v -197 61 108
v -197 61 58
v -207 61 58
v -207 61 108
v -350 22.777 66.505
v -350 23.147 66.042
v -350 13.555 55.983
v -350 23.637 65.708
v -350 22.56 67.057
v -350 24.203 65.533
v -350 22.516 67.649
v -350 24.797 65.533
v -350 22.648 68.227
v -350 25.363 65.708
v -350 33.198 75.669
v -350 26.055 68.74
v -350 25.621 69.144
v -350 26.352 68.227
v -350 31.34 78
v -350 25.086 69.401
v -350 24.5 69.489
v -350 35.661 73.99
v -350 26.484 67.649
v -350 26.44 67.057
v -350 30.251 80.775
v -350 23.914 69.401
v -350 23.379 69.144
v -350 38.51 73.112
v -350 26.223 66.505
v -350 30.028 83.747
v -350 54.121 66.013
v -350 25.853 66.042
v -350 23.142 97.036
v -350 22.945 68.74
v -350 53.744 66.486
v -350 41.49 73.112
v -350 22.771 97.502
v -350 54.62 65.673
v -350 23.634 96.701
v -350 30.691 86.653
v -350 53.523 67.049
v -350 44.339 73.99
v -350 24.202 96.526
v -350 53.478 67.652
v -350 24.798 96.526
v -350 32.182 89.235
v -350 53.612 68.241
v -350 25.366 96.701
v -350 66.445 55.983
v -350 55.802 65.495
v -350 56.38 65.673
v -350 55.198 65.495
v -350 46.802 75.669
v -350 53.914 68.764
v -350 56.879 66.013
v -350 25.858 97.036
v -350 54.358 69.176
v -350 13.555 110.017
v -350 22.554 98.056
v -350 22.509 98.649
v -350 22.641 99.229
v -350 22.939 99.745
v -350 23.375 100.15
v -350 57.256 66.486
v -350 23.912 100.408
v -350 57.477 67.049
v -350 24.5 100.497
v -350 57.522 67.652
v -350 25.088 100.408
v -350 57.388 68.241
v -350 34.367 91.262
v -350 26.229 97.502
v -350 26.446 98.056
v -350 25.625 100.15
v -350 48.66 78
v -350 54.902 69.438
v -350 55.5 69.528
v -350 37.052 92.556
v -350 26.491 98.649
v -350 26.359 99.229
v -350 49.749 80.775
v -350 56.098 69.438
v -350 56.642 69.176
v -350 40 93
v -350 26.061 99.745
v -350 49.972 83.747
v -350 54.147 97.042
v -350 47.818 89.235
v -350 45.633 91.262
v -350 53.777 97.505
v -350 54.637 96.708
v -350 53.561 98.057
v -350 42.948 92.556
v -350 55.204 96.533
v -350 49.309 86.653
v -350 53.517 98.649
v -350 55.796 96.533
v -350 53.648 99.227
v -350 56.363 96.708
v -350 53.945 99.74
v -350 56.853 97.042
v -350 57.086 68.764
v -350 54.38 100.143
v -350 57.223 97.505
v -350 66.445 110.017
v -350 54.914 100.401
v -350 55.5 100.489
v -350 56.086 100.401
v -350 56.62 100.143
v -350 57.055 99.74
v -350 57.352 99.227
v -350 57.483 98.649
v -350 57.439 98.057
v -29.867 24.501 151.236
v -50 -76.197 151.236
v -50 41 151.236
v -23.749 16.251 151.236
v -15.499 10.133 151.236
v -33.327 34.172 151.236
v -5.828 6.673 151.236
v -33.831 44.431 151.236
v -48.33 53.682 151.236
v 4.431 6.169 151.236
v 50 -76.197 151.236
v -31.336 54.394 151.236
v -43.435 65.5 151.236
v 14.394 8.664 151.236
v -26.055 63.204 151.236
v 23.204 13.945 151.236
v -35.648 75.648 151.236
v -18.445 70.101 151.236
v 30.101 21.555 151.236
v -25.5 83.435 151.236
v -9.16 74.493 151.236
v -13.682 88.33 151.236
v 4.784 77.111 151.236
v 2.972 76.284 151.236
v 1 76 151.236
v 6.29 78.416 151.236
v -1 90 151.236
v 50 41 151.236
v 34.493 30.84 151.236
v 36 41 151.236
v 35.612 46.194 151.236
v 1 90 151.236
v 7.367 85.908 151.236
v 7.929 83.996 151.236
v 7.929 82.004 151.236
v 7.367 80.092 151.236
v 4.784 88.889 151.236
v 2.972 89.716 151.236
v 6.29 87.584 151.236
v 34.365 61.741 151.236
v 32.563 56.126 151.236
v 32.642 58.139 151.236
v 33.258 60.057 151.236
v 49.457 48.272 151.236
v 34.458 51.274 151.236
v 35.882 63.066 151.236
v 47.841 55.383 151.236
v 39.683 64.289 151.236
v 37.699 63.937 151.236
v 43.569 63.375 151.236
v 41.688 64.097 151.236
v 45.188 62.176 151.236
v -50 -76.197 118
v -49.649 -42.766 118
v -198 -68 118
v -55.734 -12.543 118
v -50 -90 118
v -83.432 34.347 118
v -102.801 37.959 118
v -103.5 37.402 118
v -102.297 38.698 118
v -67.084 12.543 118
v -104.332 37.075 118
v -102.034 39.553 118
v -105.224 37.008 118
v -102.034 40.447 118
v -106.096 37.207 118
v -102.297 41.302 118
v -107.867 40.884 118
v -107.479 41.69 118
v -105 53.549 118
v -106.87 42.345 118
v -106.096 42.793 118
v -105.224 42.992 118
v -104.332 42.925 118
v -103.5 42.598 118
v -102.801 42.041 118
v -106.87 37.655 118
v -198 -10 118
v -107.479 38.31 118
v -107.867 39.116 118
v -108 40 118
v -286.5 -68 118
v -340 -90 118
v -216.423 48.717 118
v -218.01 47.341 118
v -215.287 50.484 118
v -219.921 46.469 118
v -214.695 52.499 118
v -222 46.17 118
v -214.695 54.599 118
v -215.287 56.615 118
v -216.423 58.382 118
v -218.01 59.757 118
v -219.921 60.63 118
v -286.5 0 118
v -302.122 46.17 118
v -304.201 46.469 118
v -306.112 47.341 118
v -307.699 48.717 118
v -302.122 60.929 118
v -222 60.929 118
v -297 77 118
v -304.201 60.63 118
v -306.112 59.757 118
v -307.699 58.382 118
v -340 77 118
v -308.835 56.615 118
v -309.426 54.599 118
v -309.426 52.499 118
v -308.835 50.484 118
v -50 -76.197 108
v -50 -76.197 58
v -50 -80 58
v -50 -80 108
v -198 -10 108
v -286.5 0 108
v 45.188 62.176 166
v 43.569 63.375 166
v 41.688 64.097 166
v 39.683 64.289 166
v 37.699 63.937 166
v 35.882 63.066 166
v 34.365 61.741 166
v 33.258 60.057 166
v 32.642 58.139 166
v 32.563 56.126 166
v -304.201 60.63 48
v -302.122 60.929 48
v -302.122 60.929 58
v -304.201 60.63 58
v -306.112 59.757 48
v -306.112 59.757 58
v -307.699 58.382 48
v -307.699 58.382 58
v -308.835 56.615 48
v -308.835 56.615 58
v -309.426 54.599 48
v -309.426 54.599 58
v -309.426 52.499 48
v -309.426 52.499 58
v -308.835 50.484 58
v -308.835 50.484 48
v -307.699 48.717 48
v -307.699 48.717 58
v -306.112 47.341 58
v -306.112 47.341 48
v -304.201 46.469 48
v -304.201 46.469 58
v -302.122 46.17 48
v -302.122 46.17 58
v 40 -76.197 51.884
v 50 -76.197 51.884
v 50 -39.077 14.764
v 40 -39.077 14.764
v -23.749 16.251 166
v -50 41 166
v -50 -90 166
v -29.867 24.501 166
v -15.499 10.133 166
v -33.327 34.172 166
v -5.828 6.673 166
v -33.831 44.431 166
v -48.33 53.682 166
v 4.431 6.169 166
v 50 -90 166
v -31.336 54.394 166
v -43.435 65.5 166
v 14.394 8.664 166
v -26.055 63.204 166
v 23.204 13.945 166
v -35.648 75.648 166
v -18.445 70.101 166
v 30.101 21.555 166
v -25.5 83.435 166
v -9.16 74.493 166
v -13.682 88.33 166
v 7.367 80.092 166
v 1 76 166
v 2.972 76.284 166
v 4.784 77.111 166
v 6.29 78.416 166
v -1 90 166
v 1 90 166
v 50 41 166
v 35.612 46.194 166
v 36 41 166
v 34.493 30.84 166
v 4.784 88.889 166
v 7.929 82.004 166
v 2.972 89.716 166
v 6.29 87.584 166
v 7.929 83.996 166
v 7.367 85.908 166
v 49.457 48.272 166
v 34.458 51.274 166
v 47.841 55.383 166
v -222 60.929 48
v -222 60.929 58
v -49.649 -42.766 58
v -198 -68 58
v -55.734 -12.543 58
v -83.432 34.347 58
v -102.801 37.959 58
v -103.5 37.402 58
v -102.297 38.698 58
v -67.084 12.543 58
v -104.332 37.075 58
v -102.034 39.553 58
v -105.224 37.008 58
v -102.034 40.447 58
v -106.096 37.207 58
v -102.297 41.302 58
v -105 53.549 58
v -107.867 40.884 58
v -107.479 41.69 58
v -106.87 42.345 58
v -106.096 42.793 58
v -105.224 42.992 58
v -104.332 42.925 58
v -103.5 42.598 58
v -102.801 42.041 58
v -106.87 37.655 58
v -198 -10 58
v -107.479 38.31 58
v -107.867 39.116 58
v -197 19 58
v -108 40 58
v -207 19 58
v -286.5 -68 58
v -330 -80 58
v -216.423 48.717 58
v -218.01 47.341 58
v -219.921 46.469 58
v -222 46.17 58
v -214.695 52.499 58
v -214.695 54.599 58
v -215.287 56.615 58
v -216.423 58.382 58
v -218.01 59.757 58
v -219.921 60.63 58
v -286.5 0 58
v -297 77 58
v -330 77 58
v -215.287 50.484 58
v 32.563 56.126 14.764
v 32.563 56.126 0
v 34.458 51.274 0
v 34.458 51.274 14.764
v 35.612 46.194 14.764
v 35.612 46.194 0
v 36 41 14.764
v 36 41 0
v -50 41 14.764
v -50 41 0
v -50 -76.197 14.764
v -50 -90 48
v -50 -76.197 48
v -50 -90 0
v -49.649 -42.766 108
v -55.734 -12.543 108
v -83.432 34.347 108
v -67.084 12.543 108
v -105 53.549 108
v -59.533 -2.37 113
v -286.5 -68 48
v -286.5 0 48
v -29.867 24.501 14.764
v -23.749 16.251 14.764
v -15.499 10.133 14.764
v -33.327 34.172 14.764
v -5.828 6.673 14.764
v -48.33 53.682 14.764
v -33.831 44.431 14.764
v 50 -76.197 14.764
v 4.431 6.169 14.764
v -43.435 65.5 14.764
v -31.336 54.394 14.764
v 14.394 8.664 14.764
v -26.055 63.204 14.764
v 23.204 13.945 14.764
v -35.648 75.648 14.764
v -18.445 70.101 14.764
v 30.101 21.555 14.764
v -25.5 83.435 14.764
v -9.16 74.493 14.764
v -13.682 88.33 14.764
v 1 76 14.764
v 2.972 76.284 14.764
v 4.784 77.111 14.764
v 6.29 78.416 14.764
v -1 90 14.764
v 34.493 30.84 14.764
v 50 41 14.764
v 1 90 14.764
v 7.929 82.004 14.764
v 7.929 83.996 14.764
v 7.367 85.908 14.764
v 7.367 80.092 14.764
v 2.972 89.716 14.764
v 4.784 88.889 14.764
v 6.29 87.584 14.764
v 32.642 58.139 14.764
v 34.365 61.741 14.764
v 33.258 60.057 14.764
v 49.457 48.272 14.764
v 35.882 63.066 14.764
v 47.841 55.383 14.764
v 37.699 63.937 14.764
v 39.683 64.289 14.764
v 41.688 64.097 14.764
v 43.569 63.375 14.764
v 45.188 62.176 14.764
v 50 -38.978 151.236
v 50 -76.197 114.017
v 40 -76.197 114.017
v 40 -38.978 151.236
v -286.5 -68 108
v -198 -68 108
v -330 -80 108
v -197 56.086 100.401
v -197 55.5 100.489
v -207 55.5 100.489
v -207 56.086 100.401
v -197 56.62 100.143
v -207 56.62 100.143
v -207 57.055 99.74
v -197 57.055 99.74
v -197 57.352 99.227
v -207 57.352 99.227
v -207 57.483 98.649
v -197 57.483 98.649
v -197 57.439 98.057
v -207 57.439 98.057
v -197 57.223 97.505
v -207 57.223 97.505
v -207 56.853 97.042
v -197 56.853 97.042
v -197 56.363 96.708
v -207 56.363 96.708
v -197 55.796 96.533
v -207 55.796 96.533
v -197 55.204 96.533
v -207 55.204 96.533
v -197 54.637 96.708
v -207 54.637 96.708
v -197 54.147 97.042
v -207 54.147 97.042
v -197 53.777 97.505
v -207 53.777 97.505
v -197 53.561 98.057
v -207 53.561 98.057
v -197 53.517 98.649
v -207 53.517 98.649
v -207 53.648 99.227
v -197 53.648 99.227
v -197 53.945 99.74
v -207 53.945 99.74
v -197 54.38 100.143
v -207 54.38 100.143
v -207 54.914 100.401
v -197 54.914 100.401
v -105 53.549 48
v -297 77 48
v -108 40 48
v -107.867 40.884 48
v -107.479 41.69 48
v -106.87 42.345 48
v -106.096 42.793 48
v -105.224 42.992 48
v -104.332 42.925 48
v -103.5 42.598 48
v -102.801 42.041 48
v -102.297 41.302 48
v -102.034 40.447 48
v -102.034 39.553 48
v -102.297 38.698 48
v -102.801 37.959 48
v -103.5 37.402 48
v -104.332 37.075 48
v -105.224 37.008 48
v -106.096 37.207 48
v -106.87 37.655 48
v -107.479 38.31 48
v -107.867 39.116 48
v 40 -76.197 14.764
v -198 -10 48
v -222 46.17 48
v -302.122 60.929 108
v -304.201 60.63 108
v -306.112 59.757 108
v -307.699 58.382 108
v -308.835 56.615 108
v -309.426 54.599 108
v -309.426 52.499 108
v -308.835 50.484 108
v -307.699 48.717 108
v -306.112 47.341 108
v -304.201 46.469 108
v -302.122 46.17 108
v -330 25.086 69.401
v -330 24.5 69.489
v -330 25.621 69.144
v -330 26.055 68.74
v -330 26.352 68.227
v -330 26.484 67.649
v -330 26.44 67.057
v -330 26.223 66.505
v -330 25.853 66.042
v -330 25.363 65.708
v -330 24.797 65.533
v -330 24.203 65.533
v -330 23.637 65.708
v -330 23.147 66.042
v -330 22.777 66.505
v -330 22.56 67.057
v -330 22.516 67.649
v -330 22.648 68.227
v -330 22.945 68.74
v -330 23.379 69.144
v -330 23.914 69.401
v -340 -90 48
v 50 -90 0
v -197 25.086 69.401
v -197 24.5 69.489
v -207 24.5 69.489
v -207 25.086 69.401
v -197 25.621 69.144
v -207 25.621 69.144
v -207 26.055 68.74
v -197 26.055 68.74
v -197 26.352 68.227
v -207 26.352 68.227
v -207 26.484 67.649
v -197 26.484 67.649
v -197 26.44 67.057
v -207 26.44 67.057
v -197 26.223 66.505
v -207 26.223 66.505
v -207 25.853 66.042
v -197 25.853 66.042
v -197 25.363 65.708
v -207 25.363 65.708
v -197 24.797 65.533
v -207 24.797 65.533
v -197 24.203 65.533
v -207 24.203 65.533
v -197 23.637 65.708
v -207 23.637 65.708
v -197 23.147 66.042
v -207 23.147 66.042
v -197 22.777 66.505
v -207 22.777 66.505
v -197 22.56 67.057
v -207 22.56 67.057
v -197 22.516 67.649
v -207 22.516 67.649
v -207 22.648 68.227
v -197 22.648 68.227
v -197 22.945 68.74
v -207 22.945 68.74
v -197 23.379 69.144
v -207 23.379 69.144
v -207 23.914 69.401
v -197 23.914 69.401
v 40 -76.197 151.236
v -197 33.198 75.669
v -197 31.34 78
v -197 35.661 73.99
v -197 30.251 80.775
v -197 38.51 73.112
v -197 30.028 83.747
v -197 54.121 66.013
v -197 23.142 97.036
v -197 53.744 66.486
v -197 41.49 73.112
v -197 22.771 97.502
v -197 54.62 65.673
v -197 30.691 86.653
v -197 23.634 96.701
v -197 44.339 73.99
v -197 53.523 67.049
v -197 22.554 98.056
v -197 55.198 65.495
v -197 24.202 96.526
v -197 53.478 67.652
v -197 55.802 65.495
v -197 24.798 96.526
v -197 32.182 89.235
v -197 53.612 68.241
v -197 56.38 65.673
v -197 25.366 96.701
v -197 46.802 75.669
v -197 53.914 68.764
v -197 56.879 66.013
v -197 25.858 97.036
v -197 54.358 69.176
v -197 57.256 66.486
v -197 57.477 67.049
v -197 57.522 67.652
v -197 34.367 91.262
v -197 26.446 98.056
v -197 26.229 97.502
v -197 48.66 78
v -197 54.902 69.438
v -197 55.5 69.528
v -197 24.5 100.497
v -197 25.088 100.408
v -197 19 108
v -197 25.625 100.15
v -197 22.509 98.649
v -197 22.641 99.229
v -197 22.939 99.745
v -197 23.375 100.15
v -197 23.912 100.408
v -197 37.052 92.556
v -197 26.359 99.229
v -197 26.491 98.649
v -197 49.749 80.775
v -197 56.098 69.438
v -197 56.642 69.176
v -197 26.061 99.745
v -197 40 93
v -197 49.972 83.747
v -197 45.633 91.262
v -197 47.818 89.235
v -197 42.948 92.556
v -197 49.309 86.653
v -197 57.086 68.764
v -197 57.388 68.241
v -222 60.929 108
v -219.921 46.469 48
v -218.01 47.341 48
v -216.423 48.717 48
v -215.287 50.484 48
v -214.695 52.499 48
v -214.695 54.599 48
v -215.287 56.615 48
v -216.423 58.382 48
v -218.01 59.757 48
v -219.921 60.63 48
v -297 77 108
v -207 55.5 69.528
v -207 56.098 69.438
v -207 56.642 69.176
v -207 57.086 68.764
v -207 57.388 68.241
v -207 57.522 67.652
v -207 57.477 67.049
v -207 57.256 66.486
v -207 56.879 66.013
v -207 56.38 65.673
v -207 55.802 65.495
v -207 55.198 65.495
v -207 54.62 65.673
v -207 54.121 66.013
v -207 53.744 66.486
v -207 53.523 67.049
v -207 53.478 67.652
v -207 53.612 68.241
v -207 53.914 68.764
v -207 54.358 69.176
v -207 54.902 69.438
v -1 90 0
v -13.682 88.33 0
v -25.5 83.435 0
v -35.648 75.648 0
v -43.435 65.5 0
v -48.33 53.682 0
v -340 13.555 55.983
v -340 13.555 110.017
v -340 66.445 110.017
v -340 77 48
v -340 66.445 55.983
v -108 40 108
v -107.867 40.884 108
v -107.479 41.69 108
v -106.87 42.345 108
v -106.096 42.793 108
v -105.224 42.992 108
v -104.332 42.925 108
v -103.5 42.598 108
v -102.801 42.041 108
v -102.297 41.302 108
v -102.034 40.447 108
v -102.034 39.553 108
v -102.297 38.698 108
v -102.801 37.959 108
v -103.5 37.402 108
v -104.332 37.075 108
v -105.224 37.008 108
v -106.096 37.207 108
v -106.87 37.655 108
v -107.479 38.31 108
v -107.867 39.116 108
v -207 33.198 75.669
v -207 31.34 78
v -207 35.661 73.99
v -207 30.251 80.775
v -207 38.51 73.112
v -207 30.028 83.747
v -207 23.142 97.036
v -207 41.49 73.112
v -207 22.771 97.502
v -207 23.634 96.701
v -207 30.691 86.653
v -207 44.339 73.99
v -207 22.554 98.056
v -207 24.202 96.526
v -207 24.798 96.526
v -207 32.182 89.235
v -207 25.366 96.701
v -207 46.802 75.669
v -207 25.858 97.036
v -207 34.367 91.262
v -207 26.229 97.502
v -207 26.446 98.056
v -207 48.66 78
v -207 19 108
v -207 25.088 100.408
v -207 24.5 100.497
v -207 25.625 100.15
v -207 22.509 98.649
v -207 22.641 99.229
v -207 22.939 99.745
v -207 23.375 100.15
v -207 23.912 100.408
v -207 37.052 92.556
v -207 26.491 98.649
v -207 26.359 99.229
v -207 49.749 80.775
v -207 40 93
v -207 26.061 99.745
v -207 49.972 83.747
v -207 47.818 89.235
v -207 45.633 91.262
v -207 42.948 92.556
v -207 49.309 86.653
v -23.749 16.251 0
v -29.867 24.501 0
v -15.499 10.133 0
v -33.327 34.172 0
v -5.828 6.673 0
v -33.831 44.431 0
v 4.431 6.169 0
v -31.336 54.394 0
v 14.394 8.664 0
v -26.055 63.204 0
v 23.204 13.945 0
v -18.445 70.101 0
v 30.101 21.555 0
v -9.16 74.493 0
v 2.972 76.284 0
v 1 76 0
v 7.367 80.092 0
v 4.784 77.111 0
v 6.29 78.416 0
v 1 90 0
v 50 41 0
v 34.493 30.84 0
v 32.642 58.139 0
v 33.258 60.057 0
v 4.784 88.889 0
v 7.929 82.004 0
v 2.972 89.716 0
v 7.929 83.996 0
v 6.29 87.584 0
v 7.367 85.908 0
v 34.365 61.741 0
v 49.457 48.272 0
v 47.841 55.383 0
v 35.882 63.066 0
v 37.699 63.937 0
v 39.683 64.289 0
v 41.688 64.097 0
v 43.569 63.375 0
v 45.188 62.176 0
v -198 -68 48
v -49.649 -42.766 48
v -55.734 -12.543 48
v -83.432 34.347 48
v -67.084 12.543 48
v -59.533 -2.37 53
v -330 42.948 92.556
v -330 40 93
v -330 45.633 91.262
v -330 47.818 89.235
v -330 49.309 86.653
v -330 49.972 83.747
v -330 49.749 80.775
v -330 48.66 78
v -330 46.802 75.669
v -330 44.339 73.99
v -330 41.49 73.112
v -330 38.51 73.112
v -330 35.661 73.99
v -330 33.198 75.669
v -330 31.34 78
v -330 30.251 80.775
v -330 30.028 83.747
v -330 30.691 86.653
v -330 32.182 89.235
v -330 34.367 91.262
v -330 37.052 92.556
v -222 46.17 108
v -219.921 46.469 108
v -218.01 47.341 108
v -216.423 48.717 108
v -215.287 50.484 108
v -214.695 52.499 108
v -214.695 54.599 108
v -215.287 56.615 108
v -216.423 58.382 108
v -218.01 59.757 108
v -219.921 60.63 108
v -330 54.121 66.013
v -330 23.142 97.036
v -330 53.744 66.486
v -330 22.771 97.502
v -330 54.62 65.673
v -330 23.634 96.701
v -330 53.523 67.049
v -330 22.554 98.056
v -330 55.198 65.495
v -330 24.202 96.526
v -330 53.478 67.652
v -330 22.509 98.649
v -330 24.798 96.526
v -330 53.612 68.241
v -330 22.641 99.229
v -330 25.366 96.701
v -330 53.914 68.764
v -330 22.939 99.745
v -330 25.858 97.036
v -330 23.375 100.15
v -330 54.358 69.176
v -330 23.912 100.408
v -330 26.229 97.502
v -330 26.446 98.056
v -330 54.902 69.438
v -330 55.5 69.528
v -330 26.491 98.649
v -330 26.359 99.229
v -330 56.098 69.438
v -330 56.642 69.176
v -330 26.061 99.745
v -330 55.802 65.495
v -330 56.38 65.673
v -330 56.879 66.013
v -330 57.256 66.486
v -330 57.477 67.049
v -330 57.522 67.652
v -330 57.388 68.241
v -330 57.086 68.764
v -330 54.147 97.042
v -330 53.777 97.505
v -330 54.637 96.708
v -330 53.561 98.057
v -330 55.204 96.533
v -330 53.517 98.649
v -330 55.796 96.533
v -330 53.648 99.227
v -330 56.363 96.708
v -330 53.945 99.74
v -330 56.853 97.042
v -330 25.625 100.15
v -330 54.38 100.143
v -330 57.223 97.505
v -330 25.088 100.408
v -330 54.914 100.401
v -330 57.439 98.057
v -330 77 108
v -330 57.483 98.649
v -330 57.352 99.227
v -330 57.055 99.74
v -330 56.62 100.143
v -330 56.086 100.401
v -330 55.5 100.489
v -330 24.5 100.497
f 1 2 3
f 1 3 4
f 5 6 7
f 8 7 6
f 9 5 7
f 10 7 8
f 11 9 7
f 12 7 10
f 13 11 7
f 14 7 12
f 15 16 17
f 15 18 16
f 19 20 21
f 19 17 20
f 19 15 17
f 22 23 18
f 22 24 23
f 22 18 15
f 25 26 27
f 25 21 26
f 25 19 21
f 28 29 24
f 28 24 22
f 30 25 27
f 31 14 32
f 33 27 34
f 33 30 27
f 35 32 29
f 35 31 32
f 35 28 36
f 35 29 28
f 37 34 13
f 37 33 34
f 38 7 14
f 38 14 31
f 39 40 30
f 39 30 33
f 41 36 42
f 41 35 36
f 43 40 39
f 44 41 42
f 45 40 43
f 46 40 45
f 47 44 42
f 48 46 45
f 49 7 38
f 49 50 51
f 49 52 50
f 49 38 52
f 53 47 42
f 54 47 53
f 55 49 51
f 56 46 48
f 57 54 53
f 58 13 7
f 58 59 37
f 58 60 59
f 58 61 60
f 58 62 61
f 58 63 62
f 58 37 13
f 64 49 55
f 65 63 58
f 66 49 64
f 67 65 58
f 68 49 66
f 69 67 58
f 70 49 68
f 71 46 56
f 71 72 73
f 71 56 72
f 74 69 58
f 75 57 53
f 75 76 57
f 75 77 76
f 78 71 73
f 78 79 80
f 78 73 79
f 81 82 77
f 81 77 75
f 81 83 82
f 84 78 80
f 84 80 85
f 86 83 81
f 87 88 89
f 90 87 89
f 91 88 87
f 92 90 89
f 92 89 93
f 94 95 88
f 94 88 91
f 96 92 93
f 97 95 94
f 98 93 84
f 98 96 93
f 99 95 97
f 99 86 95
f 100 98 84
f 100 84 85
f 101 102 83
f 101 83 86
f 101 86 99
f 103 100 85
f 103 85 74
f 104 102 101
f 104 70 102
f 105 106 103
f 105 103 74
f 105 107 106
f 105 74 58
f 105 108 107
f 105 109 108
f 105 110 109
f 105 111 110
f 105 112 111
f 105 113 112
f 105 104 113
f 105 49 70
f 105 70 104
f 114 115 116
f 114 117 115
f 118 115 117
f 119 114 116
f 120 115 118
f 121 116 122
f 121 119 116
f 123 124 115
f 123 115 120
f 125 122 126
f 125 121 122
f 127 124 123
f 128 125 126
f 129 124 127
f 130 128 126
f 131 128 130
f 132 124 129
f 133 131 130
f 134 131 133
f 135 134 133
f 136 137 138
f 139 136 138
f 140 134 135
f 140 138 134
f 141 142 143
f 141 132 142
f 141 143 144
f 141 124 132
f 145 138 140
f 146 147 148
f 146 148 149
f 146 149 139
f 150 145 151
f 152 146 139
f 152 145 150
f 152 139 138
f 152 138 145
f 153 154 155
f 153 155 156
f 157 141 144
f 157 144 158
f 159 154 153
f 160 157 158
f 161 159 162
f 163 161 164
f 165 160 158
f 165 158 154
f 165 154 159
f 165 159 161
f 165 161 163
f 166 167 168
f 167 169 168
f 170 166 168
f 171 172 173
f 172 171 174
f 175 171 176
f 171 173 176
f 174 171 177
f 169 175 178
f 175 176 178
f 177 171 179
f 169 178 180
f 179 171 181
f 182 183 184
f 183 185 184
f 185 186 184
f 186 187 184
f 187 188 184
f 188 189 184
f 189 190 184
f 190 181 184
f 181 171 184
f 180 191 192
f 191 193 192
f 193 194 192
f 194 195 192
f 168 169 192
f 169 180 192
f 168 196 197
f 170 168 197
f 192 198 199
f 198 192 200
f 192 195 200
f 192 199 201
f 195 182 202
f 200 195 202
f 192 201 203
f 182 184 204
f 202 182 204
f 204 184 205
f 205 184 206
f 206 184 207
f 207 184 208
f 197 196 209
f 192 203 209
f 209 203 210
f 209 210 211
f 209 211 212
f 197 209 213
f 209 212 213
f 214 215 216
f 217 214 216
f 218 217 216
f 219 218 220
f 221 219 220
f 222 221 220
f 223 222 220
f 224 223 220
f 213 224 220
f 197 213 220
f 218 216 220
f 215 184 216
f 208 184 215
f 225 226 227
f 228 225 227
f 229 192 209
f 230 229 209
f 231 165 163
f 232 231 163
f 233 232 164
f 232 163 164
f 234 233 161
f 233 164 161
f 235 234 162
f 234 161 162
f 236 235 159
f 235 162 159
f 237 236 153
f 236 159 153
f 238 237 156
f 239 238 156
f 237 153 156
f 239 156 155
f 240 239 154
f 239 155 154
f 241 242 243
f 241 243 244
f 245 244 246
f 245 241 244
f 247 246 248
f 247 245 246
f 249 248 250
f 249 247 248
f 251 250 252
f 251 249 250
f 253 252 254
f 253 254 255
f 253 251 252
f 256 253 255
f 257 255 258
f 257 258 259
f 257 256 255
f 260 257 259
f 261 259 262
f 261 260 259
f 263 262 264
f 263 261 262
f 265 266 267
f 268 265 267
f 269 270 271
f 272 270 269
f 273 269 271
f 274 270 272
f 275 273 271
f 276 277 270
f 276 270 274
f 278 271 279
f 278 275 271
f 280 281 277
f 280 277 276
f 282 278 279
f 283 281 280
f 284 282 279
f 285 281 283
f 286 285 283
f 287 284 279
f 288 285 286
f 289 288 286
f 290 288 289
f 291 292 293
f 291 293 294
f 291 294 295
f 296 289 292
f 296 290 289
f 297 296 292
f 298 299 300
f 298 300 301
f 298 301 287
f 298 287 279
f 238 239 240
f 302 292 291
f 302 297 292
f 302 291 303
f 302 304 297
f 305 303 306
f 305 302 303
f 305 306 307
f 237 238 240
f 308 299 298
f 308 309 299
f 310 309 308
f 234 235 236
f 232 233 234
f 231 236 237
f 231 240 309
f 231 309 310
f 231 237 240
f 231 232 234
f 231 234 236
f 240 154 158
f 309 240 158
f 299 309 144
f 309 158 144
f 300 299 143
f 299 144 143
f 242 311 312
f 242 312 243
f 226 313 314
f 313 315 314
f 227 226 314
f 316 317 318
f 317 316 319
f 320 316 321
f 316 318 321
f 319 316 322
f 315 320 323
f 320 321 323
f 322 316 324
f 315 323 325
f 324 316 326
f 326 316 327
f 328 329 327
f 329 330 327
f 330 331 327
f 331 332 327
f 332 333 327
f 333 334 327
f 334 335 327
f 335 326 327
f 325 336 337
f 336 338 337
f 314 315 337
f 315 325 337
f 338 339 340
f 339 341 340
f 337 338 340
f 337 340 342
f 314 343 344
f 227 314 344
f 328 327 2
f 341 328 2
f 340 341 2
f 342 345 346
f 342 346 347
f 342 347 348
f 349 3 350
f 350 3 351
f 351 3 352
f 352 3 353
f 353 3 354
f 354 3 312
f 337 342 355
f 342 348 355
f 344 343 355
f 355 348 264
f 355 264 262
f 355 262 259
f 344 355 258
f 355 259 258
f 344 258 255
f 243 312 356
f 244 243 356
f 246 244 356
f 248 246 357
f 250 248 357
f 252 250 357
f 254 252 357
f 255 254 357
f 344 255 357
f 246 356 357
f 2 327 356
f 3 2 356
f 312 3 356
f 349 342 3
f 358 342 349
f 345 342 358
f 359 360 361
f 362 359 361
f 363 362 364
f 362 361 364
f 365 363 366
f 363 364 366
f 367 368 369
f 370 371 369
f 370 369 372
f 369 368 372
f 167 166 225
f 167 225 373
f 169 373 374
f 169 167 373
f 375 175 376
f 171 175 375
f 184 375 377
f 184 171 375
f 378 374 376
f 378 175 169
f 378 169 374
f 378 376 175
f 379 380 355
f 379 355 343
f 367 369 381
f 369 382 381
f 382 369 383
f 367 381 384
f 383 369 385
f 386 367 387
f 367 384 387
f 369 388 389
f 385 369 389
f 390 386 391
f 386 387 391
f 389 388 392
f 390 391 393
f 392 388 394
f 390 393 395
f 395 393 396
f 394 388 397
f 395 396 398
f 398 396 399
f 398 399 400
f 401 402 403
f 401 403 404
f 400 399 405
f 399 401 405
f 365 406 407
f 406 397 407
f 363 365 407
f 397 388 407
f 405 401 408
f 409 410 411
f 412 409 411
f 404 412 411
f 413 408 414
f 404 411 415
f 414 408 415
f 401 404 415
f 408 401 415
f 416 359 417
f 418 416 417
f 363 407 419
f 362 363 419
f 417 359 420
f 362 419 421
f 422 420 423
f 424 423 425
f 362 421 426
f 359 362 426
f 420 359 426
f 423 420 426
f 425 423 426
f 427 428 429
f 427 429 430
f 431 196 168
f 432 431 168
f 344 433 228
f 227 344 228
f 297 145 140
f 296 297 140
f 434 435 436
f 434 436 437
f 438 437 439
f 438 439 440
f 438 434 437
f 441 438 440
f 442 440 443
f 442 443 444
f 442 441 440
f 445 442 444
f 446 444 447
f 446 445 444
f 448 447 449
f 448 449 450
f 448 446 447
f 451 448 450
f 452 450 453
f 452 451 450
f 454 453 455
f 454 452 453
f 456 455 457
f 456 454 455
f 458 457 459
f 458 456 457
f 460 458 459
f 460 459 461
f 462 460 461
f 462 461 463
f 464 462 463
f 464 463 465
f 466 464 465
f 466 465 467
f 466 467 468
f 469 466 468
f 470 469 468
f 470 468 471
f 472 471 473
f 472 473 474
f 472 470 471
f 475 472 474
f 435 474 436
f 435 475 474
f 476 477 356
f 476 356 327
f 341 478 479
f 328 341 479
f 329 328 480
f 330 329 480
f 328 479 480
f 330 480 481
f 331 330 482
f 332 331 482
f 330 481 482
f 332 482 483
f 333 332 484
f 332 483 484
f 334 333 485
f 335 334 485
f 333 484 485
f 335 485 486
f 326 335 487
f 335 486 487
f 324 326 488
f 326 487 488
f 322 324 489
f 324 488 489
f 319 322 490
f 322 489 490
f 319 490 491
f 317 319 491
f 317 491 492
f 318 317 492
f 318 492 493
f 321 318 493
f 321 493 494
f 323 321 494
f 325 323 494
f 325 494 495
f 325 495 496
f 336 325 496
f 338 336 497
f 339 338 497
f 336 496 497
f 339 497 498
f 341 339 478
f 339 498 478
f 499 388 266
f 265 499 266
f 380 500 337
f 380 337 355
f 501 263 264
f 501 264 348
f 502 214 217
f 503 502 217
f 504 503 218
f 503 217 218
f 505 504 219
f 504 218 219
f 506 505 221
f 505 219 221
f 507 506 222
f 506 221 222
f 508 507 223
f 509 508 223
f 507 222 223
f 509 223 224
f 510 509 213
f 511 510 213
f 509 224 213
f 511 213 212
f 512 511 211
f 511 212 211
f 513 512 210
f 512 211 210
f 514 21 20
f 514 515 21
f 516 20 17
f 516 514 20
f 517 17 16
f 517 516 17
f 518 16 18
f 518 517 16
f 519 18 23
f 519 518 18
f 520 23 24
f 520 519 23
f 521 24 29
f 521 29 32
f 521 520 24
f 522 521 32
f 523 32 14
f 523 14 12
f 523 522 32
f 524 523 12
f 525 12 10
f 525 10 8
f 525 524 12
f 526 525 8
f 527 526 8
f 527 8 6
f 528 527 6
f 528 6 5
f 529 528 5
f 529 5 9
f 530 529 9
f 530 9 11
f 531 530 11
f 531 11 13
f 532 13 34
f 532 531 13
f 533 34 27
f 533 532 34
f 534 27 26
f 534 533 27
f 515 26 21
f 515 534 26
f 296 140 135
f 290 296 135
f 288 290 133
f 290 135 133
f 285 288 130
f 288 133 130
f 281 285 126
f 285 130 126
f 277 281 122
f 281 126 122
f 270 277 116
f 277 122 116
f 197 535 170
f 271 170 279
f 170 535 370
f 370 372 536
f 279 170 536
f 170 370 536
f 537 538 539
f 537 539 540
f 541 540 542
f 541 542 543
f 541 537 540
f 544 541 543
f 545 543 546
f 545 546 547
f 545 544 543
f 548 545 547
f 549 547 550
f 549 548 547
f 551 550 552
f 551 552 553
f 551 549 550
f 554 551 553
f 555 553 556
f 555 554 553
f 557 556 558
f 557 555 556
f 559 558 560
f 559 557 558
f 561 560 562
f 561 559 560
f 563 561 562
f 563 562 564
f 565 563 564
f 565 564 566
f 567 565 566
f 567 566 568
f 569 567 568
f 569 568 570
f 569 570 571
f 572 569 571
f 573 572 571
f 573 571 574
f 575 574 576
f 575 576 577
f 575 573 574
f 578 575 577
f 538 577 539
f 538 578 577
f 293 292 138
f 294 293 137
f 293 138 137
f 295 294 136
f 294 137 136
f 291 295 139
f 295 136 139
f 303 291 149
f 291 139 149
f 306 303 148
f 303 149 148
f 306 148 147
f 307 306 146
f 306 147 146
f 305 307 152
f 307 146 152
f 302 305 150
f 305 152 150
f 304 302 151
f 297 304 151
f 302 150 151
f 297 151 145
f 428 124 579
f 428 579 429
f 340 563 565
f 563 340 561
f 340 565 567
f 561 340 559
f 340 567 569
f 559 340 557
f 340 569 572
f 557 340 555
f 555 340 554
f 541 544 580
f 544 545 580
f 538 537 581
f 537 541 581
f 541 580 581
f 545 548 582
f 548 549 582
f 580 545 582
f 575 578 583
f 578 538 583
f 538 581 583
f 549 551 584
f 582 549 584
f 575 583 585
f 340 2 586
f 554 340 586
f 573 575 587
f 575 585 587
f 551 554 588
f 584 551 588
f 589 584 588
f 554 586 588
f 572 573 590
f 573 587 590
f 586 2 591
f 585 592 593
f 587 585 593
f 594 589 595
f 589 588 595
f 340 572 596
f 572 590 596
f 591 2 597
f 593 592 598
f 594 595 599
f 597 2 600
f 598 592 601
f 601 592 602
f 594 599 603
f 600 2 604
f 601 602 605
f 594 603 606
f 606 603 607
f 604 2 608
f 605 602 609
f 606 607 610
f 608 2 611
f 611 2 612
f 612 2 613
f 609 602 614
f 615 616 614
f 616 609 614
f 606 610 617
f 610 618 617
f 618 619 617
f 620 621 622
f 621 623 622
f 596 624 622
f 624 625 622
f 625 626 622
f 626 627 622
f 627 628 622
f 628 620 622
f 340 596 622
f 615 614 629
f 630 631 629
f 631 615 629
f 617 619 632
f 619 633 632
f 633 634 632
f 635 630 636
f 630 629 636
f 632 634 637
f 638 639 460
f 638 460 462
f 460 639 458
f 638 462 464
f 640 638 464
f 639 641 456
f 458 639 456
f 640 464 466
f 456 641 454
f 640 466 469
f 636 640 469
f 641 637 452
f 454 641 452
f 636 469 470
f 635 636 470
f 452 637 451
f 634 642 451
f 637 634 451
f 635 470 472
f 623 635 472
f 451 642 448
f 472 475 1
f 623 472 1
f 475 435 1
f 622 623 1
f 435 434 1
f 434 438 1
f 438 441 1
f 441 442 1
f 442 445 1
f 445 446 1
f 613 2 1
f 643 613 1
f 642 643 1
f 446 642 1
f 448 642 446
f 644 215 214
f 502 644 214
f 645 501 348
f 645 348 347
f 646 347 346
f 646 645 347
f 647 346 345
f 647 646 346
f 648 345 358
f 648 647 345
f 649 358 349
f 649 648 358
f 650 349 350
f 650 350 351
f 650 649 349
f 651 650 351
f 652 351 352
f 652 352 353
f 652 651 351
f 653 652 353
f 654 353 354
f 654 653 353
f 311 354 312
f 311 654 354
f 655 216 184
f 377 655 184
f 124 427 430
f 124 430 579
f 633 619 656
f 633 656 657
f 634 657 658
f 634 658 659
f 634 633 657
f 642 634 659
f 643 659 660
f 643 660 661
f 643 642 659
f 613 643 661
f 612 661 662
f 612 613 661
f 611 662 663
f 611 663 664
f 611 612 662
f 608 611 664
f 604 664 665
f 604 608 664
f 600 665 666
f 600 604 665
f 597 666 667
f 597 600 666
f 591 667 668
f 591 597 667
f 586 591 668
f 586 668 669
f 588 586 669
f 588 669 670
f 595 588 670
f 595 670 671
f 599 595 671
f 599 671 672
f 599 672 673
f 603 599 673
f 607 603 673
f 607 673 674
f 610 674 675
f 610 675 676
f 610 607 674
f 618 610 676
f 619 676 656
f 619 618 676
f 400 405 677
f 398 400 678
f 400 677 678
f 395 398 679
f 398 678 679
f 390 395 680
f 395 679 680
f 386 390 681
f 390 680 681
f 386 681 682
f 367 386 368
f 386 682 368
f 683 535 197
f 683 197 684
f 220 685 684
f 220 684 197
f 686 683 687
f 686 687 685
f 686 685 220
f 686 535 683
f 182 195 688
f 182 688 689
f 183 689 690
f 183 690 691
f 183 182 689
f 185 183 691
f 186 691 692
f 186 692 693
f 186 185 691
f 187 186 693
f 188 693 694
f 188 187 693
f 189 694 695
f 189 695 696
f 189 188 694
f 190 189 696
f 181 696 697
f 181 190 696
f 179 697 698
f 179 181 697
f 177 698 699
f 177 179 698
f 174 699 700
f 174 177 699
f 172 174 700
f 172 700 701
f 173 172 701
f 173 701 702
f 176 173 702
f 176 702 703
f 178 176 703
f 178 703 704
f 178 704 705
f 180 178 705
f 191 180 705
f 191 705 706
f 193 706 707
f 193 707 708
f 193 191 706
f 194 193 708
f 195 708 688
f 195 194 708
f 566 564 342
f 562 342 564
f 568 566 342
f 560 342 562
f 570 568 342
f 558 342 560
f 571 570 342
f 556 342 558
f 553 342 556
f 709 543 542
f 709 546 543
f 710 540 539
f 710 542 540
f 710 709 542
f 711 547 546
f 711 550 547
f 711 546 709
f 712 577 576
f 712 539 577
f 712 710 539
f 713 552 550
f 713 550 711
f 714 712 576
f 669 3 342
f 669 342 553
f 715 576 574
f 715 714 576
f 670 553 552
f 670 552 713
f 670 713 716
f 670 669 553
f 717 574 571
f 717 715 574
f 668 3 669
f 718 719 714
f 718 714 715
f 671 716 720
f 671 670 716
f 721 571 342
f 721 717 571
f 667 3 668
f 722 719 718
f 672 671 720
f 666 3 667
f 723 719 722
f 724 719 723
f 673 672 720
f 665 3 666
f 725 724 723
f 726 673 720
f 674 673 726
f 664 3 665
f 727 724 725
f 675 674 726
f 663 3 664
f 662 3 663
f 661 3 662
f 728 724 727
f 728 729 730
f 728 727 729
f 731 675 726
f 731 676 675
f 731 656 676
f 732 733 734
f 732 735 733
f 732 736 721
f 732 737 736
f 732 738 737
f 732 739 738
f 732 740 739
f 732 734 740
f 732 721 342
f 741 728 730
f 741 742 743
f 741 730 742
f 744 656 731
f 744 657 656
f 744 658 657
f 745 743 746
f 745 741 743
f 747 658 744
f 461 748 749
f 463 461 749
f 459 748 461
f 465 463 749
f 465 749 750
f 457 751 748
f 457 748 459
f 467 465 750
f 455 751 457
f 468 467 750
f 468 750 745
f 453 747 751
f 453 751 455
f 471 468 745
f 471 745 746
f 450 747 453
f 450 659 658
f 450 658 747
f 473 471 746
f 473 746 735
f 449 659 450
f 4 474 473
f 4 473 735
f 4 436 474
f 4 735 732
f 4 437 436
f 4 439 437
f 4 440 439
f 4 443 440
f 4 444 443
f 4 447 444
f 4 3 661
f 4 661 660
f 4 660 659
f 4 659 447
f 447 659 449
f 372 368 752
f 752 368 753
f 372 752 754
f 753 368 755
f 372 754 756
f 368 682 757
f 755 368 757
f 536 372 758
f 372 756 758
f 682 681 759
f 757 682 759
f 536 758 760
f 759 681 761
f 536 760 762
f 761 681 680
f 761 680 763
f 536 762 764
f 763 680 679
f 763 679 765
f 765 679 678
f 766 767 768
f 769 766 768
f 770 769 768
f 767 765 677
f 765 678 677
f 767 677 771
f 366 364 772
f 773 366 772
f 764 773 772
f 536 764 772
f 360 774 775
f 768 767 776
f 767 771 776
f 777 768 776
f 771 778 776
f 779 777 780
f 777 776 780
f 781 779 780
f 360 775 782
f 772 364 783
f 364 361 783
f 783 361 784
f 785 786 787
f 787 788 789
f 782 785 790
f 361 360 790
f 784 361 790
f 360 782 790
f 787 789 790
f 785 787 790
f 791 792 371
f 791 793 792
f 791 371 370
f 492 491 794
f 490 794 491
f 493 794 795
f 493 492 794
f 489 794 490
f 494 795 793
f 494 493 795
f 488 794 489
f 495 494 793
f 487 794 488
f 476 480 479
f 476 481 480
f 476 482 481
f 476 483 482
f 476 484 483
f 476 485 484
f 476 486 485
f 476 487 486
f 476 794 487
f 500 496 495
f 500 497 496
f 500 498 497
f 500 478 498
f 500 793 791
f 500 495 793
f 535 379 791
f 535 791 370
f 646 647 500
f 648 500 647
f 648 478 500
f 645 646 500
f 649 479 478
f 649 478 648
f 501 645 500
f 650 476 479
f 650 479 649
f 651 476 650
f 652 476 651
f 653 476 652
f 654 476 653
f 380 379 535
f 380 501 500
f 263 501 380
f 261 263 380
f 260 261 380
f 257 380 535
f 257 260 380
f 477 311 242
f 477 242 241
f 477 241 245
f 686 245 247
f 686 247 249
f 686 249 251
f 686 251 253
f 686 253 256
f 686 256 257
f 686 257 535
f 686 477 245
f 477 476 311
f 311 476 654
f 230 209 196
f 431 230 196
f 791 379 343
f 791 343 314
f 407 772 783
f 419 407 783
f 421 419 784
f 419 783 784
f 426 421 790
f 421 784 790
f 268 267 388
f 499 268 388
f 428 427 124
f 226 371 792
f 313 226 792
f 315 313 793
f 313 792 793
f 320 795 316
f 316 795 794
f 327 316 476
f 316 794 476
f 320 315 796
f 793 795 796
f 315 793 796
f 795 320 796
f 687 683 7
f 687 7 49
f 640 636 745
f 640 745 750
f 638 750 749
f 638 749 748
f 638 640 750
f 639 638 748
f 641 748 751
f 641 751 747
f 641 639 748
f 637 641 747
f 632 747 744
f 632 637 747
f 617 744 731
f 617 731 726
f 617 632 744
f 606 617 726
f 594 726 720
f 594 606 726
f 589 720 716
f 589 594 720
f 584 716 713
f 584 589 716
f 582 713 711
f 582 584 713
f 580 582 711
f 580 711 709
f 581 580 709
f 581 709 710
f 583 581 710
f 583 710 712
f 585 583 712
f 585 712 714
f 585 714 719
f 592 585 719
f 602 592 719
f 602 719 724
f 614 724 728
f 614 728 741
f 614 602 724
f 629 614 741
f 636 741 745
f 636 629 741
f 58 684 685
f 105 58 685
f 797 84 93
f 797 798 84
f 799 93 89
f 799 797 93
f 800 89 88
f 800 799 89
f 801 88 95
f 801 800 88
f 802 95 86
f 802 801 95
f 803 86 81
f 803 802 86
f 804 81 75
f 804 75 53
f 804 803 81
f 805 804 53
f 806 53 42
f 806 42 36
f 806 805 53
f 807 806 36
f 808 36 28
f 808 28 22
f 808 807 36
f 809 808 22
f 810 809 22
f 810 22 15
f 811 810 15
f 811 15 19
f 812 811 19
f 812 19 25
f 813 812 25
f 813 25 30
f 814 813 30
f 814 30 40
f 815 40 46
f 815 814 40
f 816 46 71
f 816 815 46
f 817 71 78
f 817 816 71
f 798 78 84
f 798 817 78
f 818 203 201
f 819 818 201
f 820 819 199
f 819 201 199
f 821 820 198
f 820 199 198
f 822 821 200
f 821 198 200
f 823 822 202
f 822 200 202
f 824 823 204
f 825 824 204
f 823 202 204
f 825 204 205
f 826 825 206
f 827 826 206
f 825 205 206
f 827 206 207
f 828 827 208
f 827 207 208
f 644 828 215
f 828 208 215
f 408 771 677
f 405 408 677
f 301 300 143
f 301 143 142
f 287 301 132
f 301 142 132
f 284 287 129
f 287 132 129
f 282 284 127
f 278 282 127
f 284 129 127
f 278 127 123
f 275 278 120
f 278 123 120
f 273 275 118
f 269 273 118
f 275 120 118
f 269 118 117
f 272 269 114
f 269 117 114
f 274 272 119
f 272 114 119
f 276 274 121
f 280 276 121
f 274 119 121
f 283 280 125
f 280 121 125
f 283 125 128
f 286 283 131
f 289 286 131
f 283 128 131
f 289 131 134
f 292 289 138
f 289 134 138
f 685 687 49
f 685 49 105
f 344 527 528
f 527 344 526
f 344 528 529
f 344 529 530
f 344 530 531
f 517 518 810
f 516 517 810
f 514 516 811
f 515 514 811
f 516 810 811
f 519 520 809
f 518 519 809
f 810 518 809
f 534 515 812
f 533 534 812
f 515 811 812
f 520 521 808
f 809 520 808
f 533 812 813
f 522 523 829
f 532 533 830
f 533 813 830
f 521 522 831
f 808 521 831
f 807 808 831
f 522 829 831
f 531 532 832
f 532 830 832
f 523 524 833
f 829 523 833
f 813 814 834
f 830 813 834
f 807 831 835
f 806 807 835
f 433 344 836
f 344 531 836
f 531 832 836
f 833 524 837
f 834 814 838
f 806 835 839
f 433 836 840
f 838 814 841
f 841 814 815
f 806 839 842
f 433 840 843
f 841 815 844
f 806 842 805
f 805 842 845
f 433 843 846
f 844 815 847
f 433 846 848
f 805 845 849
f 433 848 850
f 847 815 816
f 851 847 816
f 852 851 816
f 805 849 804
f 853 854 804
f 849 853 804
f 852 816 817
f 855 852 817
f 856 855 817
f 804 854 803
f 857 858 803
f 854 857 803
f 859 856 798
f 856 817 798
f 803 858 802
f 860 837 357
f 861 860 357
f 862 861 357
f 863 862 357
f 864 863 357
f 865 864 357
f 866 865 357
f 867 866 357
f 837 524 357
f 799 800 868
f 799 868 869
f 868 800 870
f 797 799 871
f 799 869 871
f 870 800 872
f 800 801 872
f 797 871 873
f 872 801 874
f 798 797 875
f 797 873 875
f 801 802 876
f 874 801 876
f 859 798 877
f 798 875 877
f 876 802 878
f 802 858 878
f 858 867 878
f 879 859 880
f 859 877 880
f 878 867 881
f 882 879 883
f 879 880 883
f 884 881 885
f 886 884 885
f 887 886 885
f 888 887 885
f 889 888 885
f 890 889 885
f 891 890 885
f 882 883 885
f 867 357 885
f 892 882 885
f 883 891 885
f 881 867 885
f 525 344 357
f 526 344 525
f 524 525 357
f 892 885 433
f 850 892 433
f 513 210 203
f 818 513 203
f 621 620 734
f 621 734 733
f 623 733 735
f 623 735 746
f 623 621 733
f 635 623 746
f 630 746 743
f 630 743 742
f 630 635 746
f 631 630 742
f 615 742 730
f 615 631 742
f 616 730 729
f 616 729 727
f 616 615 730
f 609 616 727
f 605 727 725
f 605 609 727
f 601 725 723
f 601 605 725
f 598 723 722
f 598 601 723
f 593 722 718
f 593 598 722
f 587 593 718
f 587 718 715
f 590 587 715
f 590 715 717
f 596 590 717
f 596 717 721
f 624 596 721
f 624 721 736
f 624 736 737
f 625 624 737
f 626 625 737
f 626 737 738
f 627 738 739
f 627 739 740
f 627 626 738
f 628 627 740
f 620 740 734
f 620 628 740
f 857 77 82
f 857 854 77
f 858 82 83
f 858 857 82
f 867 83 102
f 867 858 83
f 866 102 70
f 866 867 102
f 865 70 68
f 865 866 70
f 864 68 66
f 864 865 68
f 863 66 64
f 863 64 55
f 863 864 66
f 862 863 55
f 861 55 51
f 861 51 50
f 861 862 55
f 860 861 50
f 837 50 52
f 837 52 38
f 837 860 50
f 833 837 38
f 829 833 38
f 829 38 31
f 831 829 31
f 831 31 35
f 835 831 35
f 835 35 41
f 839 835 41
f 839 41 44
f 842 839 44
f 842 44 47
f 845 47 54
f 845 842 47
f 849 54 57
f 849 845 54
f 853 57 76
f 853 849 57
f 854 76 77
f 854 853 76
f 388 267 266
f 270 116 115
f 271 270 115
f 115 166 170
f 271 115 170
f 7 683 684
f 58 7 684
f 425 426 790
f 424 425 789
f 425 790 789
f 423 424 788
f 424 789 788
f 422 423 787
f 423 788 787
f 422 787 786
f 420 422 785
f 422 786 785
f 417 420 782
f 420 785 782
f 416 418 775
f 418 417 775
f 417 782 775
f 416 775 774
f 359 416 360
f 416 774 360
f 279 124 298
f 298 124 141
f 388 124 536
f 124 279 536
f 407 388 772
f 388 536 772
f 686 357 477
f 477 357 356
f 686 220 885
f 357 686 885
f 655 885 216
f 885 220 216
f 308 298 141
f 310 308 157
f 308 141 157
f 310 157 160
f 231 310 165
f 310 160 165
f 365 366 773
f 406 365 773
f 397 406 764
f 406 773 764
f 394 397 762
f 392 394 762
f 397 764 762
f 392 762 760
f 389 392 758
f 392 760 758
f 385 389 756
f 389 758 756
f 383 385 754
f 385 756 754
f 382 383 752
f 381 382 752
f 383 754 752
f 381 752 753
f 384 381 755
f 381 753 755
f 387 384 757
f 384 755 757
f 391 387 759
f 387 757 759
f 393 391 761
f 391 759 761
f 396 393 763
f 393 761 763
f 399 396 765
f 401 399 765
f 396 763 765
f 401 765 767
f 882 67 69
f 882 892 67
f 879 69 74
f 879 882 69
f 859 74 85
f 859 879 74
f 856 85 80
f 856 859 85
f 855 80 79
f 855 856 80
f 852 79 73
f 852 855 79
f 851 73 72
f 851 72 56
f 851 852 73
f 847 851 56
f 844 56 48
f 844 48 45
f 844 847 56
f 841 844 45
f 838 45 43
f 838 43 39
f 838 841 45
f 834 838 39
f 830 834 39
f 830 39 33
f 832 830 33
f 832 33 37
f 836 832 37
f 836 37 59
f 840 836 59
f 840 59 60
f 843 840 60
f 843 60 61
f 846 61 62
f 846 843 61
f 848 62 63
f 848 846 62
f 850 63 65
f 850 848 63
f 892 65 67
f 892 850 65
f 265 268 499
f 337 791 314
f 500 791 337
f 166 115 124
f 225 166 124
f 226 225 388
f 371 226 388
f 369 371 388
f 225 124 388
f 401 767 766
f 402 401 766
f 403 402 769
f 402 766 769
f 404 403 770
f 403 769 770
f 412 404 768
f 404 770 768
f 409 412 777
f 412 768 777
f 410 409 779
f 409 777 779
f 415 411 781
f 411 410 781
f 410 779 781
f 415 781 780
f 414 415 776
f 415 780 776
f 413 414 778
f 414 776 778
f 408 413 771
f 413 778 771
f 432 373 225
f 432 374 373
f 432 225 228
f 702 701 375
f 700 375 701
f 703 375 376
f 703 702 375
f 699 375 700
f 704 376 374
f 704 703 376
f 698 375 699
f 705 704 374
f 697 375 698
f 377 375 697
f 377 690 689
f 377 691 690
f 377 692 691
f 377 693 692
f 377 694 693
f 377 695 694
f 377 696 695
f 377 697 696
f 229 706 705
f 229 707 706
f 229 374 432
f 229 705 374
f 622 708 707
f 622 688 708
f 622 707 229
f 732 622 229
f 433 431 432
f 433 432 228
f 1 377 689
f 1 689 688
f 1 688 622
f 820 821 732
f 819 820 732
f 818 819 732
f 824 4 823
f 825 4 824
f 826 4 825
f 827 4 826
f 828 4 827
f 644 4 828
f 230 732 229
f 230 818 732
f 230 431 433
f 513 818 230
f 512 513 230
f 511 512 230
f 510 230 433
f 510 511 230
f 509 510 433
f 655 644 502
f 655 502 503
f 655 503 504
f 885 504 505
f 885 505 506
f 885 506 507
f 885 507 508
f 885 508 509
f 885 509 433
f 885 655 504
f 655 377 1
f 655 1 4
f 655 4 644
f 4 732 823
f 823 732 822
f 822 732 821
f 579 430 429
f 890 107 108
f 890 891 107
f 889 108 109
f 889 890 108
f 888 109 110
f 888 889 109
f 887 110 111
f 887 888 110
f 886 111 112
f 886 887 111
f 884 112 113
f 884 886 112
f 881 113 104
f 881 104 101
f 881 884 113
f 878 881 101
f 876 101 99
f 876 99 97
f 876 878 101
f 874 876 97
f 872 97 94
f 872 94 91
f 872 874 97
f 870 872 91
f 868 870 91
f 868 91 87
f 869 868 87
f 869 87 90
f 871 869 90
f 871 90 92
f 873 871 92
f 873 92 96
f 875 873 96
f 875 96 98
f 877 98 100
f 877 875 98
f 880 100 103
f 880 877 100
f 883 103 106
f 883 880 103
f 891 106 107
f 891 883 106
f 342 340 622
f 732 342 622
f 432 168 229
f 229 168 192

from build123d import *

# Parameters (mm, degrees)
SALIENTE_EXTRUIR1_DEPTH   = 166
CROQUIS2_W                = 136.472436182
CROQUIS2_H                = 332.394220402
CORTAR_EXTRUIR1_DEPTH     = 214.672646822
CROQUIS3_R                = 3
SALIENTE_EXTRUIR2_DEPTH   = 10
CROQUIS4_W                = 290
CROQUIS4_H                = 70
SALIENTE_EXTRUIR4_DEPTH   = 10
CROQUIS5_W                = 70
CROQUIS5_H                = 167
SALIENTE_EXTRUIR5_DEPTH   = 10
SALIENTE_EXTRUIR6_DEPTH   = 10
SALIENTE_EXTRUIR6_2_DEPTH = 10
CROQUIS7_W                = 50
CROQUIS7_H                = 42
CROQUIS7_R                = 10
CROQUIS7_R_2              = 2.028066214
CROQUIS7_R_3              = 1.989058601
CROQUIS7_R_4              = 1.996538367
CROQUIS7_R_5              = 1.989473388
SALIENTE_EXTRUIR7_DEPTH   = 10
CROQUIS8_R                = 1.996538367
CROQUIS8_R_2              = 1.989473388
CROQUIS8_R_3              = 2.028066214
CROQUIS8_R_4              = 1.989058601
CROQUIS8_R_5              = 10
CORTAR_EXTRUIR2_DEPTH     = 425.330060234
CROQUIS9_W                = 54.034718828
CROQUIS9_H                = 52.889277074
CROQUIS9_R                = 2.028066214
CROQUIS9_R_2              = 10
CROQUIS9_R_3              = 1.996538367
CROQUIS9_R_4              = 1.989058601
CROQUIS9_R_5              = 1.989473388
SALIENTE_EXTRUIR8_DEPTH   = 10


with BuildPart() as part:
    # Croquis1 → Saliente-Extruir1 (new body)
    with BuildSketch(Plane.XY):
        with BuildLine():
            Line((-50, -90), (50, -90))
            Line((50, -90), (50, 41))
            ThreePointArc((50, 41), (48.781850172, 51.857936921), (45.187967584, 62.176012863))
            ThreePointArc((45.187967584, 62.176012863), (36.760940571, 63.563110457), (32.562833989, 56.125723473))
            ThreePointArc((32.562833989, 56.125723473), (35.12989298, 48.755669229), (36, 41))
            ThreePointArc((36, 41), (-23.748737342, 16.251262658), (1, 76))
            ThreePointArc((1, 76), (8, 83), (1, 90))
            Line((1, 90), (-1, 90))
            ThreePointArc((-1, 90), (-35.648232278, 75.648232278), (-50, 41))
            Line((-50, 41), (-50, -90))
        make_face()
    extrude(amount=SALIENTE_EXTRUIR1_DEPTH)

    # Croquis2 → Cortar-Extruir1 (cut, through all)
    with BuildSketch(Plane(origin=(50, 0, 0), x_dir=(0, 0, -1), z_dir=(1, 0, 0))):
        with Locations((-83, 90)):
            Rectangle(CROQUIS2_W, CROQUIS2_H)
    extrude(amount=-CORTAR_EXTRUIR1_DEPTH, mode=Mode.SUBTRACT)

    # Croquis3 → Saliente-Extruir2 (add)
    with BuildSketch(Plane(origin=(0, 0, 118), x_dir=(-1, 0, 0), z_dir=(0, 0, -1))):
        with BuildLine():
            Line((340, 77), (297, 77))
            Line((297, 77), (105, 53.549266443))
            add(Edge.make_bspline(
                [(50, -76.197110201), (41.565556501, 6.583471604), (105, 53.549266443)],
                knots=[0, 0, 0, 1, 1, 1], degree=2))
            Line((50, -76.197110201), (50, -90))
            Line((50, -90), (297, -90))
            Line((297, -90), (340, -90))
            Line((340, -90), (340, 35))
            Line((340, 35), (340, 77))
        make_face()
        Polygon((198, -68), (198, -10), (286.5, 0), (286.5, -10), (286.5, -68), align=None, mode=Mode.SUBTRACT)
        with Locations((105, 40)):
            Circle(CROQUIS3_R, mode=Mode.SUBTRACT)
        with BuildLine():
            ThreePointArc((222, 46.169624348), (214.620357905, 53.549266443), (222, 60.928908538))
            Line((222, 60.928908538), (302.121828461, 60.928908538))
            ThreePointArc((302.121828461, 60.928908538), (309.501470556, 53.549266443), (302.121828461, 46.169624348))
            Line((302.121828461, 46.169624348), (222, 46.169624348))
        make_face(mode=Mode.SUBTRACT)
    saliente_extruir2 = extrude(amount=SALIENTE_EXTRUIR2_DEPTH)

    # Simetría1: Saliente-Extruir2 across plane
    add(saliente_extruir2.mirror(Plane(origin=(0, 0, 83), x_dir=(1, 0, 0), z_dir=(0, 0, -1))))

    # Croquis4 → Saliente-Extruir4 (add)
    with BuildSketch(Plane.XZ.offset(90)):
        with Locations((-195, 83)):
            Rectangle(CROQUIS4_W, CROQUIS4_H)
    extrude(amount=-SALIENTE_EXTRUIR4_DEPTH)

    # Croquis5 → Saliente-Extruir5 (add)
    with BuildSketch(Plane.ZY.offset(340)):
        with Locations((83, -6.5)):
            Rectangle(CROQUIS5_W, CROQUIS5_H)
    extrude(amount=-SALIENTE_EXTRUIR5_DEPTH)

    # Croquis7 → Saliente-Extruir7 (add)
    with BuildSketch(Plane.ZY.offset(197)):
        with Locations((83, 40)):
            Rectangle(CROQUIS7_W, CROQUIS7_H)
        with Locations((83, 40)):
            Circle(CROQUIS7_R, mode=Mode.SUBTRACT)
        with Locations((67.5, 55.5)):
            Circle(CROQUIS7_R_2, mode=Mode.SUBTRACT)
        with Locations((98.5, 55.5)):
            Circle(CROQUIS7_R_3, mode=Mode.SUBTRACT)
        with Locations((98.5, 24.5)):
            Circle(CROQUIS7_R_4, mode=Mode.SUBTRACT)
        with Locations((67.5, 24.5)):
            Circle(CROQUIS7_R_5, mode=Mode.SUBTRACT)
    extrude(amount=SALIENTE_EXTRUIR7_DEPTH)

    # Croquis8 → Cortar-Extruir2 (cut, through all)
    with BuildSketch(Plane(origin=(-330, 0, 0), x_dir=(0, 0, -1), z_dir=(1, 0, 0))):
        with Locations(Location((-98.5, 24.5, 0), (0, 0, 180))):
            Circle(CROQUIS8_R)
        with Locations(Location((-67.5, 24.5, 0), (0, 0, 180))):
            Circle(CROQUIS8_R_2)
        with Locations(Location((-67.5, 55.5, 0), (0, 0, 180))):
            Circle(CROQUIS8_R_3)
        with Locations(Location((-98.5, 55.5, 0), (0, 0, 180))):
            Circle(CROQUIS8_R_4)
        with Locations(Location((-83, 40, 0), (0, 0, 180))):
            Circle(CROQUIS8_R_5)
    extrude(amount=-CORTAR_EXTRUIR2_DEPTH, mode=Mode.SUBTRACT)

    # Croquis9 → Saliente-Extruir8 (add)
    with BuildSketch(Plane.ZY.offset(340)):
        with Locations((83, 40)):
            Rectangle(CROQUIS9_W, CROQUIS9_H)
        with Locations((67.5, 55.5)):
            Circle(CROQUIS9_R, mode=Mode.SUBTRACT)
        with Locations((83, 40)):
            Circle(CROQUIS9_R_2, mode=Mode.SUBTRACT)
        with Locations((98.5, 24.5)):
            Circle(CROQUIS9_R_3, mode=Mode.SUBTRACT)
        with Locations((98.5, 55.5)):
            Circle(CROQUIS9_R_4, mode=Mode.SUBTRACT)
        with Locations((67.5, 24.5)):
            Circle(CROQUIS9_R_5, mode=Mode.SUBTRACT)
    extrude(amount=SALIENTE_EXTRUIR8_DEPTH)


with BuildPart() as body_2:
    # Croquis6 → Saliente-Extruir6 (new body)
    with BuildSketch(Plane(origin=(50, 0, 0), x_dir=(0, 0, -1), z_dir=(1, 0, 0))):
        Polygon((-151.236218091, -76.197110201), (-114.016811226, -76.197110201), (-151.236218091, -38.977703336), align=None)
    extrude(amount=-SALIENTE_EXTRUIR6_DEPTH)


with BuildPart() as body_3:
    # Croquis6 → Saliente-Extruir6 2 (new body)
    with BuildSketch(Plane(origin=(50, 0, 0), x_dir=(0, 0, -1), z_dir=(1, 0, 0))):
        Polygon((-14.763781909, -76.197110201), (-51.883567475, -76.197110201), (-14.763781909, -39.077324636), align=None)
    extrude(amount=-SALIENTE_EXTRUIR6_2_DEPTH)


solid = Compound([part.part, body_2.part, body_3.part])
